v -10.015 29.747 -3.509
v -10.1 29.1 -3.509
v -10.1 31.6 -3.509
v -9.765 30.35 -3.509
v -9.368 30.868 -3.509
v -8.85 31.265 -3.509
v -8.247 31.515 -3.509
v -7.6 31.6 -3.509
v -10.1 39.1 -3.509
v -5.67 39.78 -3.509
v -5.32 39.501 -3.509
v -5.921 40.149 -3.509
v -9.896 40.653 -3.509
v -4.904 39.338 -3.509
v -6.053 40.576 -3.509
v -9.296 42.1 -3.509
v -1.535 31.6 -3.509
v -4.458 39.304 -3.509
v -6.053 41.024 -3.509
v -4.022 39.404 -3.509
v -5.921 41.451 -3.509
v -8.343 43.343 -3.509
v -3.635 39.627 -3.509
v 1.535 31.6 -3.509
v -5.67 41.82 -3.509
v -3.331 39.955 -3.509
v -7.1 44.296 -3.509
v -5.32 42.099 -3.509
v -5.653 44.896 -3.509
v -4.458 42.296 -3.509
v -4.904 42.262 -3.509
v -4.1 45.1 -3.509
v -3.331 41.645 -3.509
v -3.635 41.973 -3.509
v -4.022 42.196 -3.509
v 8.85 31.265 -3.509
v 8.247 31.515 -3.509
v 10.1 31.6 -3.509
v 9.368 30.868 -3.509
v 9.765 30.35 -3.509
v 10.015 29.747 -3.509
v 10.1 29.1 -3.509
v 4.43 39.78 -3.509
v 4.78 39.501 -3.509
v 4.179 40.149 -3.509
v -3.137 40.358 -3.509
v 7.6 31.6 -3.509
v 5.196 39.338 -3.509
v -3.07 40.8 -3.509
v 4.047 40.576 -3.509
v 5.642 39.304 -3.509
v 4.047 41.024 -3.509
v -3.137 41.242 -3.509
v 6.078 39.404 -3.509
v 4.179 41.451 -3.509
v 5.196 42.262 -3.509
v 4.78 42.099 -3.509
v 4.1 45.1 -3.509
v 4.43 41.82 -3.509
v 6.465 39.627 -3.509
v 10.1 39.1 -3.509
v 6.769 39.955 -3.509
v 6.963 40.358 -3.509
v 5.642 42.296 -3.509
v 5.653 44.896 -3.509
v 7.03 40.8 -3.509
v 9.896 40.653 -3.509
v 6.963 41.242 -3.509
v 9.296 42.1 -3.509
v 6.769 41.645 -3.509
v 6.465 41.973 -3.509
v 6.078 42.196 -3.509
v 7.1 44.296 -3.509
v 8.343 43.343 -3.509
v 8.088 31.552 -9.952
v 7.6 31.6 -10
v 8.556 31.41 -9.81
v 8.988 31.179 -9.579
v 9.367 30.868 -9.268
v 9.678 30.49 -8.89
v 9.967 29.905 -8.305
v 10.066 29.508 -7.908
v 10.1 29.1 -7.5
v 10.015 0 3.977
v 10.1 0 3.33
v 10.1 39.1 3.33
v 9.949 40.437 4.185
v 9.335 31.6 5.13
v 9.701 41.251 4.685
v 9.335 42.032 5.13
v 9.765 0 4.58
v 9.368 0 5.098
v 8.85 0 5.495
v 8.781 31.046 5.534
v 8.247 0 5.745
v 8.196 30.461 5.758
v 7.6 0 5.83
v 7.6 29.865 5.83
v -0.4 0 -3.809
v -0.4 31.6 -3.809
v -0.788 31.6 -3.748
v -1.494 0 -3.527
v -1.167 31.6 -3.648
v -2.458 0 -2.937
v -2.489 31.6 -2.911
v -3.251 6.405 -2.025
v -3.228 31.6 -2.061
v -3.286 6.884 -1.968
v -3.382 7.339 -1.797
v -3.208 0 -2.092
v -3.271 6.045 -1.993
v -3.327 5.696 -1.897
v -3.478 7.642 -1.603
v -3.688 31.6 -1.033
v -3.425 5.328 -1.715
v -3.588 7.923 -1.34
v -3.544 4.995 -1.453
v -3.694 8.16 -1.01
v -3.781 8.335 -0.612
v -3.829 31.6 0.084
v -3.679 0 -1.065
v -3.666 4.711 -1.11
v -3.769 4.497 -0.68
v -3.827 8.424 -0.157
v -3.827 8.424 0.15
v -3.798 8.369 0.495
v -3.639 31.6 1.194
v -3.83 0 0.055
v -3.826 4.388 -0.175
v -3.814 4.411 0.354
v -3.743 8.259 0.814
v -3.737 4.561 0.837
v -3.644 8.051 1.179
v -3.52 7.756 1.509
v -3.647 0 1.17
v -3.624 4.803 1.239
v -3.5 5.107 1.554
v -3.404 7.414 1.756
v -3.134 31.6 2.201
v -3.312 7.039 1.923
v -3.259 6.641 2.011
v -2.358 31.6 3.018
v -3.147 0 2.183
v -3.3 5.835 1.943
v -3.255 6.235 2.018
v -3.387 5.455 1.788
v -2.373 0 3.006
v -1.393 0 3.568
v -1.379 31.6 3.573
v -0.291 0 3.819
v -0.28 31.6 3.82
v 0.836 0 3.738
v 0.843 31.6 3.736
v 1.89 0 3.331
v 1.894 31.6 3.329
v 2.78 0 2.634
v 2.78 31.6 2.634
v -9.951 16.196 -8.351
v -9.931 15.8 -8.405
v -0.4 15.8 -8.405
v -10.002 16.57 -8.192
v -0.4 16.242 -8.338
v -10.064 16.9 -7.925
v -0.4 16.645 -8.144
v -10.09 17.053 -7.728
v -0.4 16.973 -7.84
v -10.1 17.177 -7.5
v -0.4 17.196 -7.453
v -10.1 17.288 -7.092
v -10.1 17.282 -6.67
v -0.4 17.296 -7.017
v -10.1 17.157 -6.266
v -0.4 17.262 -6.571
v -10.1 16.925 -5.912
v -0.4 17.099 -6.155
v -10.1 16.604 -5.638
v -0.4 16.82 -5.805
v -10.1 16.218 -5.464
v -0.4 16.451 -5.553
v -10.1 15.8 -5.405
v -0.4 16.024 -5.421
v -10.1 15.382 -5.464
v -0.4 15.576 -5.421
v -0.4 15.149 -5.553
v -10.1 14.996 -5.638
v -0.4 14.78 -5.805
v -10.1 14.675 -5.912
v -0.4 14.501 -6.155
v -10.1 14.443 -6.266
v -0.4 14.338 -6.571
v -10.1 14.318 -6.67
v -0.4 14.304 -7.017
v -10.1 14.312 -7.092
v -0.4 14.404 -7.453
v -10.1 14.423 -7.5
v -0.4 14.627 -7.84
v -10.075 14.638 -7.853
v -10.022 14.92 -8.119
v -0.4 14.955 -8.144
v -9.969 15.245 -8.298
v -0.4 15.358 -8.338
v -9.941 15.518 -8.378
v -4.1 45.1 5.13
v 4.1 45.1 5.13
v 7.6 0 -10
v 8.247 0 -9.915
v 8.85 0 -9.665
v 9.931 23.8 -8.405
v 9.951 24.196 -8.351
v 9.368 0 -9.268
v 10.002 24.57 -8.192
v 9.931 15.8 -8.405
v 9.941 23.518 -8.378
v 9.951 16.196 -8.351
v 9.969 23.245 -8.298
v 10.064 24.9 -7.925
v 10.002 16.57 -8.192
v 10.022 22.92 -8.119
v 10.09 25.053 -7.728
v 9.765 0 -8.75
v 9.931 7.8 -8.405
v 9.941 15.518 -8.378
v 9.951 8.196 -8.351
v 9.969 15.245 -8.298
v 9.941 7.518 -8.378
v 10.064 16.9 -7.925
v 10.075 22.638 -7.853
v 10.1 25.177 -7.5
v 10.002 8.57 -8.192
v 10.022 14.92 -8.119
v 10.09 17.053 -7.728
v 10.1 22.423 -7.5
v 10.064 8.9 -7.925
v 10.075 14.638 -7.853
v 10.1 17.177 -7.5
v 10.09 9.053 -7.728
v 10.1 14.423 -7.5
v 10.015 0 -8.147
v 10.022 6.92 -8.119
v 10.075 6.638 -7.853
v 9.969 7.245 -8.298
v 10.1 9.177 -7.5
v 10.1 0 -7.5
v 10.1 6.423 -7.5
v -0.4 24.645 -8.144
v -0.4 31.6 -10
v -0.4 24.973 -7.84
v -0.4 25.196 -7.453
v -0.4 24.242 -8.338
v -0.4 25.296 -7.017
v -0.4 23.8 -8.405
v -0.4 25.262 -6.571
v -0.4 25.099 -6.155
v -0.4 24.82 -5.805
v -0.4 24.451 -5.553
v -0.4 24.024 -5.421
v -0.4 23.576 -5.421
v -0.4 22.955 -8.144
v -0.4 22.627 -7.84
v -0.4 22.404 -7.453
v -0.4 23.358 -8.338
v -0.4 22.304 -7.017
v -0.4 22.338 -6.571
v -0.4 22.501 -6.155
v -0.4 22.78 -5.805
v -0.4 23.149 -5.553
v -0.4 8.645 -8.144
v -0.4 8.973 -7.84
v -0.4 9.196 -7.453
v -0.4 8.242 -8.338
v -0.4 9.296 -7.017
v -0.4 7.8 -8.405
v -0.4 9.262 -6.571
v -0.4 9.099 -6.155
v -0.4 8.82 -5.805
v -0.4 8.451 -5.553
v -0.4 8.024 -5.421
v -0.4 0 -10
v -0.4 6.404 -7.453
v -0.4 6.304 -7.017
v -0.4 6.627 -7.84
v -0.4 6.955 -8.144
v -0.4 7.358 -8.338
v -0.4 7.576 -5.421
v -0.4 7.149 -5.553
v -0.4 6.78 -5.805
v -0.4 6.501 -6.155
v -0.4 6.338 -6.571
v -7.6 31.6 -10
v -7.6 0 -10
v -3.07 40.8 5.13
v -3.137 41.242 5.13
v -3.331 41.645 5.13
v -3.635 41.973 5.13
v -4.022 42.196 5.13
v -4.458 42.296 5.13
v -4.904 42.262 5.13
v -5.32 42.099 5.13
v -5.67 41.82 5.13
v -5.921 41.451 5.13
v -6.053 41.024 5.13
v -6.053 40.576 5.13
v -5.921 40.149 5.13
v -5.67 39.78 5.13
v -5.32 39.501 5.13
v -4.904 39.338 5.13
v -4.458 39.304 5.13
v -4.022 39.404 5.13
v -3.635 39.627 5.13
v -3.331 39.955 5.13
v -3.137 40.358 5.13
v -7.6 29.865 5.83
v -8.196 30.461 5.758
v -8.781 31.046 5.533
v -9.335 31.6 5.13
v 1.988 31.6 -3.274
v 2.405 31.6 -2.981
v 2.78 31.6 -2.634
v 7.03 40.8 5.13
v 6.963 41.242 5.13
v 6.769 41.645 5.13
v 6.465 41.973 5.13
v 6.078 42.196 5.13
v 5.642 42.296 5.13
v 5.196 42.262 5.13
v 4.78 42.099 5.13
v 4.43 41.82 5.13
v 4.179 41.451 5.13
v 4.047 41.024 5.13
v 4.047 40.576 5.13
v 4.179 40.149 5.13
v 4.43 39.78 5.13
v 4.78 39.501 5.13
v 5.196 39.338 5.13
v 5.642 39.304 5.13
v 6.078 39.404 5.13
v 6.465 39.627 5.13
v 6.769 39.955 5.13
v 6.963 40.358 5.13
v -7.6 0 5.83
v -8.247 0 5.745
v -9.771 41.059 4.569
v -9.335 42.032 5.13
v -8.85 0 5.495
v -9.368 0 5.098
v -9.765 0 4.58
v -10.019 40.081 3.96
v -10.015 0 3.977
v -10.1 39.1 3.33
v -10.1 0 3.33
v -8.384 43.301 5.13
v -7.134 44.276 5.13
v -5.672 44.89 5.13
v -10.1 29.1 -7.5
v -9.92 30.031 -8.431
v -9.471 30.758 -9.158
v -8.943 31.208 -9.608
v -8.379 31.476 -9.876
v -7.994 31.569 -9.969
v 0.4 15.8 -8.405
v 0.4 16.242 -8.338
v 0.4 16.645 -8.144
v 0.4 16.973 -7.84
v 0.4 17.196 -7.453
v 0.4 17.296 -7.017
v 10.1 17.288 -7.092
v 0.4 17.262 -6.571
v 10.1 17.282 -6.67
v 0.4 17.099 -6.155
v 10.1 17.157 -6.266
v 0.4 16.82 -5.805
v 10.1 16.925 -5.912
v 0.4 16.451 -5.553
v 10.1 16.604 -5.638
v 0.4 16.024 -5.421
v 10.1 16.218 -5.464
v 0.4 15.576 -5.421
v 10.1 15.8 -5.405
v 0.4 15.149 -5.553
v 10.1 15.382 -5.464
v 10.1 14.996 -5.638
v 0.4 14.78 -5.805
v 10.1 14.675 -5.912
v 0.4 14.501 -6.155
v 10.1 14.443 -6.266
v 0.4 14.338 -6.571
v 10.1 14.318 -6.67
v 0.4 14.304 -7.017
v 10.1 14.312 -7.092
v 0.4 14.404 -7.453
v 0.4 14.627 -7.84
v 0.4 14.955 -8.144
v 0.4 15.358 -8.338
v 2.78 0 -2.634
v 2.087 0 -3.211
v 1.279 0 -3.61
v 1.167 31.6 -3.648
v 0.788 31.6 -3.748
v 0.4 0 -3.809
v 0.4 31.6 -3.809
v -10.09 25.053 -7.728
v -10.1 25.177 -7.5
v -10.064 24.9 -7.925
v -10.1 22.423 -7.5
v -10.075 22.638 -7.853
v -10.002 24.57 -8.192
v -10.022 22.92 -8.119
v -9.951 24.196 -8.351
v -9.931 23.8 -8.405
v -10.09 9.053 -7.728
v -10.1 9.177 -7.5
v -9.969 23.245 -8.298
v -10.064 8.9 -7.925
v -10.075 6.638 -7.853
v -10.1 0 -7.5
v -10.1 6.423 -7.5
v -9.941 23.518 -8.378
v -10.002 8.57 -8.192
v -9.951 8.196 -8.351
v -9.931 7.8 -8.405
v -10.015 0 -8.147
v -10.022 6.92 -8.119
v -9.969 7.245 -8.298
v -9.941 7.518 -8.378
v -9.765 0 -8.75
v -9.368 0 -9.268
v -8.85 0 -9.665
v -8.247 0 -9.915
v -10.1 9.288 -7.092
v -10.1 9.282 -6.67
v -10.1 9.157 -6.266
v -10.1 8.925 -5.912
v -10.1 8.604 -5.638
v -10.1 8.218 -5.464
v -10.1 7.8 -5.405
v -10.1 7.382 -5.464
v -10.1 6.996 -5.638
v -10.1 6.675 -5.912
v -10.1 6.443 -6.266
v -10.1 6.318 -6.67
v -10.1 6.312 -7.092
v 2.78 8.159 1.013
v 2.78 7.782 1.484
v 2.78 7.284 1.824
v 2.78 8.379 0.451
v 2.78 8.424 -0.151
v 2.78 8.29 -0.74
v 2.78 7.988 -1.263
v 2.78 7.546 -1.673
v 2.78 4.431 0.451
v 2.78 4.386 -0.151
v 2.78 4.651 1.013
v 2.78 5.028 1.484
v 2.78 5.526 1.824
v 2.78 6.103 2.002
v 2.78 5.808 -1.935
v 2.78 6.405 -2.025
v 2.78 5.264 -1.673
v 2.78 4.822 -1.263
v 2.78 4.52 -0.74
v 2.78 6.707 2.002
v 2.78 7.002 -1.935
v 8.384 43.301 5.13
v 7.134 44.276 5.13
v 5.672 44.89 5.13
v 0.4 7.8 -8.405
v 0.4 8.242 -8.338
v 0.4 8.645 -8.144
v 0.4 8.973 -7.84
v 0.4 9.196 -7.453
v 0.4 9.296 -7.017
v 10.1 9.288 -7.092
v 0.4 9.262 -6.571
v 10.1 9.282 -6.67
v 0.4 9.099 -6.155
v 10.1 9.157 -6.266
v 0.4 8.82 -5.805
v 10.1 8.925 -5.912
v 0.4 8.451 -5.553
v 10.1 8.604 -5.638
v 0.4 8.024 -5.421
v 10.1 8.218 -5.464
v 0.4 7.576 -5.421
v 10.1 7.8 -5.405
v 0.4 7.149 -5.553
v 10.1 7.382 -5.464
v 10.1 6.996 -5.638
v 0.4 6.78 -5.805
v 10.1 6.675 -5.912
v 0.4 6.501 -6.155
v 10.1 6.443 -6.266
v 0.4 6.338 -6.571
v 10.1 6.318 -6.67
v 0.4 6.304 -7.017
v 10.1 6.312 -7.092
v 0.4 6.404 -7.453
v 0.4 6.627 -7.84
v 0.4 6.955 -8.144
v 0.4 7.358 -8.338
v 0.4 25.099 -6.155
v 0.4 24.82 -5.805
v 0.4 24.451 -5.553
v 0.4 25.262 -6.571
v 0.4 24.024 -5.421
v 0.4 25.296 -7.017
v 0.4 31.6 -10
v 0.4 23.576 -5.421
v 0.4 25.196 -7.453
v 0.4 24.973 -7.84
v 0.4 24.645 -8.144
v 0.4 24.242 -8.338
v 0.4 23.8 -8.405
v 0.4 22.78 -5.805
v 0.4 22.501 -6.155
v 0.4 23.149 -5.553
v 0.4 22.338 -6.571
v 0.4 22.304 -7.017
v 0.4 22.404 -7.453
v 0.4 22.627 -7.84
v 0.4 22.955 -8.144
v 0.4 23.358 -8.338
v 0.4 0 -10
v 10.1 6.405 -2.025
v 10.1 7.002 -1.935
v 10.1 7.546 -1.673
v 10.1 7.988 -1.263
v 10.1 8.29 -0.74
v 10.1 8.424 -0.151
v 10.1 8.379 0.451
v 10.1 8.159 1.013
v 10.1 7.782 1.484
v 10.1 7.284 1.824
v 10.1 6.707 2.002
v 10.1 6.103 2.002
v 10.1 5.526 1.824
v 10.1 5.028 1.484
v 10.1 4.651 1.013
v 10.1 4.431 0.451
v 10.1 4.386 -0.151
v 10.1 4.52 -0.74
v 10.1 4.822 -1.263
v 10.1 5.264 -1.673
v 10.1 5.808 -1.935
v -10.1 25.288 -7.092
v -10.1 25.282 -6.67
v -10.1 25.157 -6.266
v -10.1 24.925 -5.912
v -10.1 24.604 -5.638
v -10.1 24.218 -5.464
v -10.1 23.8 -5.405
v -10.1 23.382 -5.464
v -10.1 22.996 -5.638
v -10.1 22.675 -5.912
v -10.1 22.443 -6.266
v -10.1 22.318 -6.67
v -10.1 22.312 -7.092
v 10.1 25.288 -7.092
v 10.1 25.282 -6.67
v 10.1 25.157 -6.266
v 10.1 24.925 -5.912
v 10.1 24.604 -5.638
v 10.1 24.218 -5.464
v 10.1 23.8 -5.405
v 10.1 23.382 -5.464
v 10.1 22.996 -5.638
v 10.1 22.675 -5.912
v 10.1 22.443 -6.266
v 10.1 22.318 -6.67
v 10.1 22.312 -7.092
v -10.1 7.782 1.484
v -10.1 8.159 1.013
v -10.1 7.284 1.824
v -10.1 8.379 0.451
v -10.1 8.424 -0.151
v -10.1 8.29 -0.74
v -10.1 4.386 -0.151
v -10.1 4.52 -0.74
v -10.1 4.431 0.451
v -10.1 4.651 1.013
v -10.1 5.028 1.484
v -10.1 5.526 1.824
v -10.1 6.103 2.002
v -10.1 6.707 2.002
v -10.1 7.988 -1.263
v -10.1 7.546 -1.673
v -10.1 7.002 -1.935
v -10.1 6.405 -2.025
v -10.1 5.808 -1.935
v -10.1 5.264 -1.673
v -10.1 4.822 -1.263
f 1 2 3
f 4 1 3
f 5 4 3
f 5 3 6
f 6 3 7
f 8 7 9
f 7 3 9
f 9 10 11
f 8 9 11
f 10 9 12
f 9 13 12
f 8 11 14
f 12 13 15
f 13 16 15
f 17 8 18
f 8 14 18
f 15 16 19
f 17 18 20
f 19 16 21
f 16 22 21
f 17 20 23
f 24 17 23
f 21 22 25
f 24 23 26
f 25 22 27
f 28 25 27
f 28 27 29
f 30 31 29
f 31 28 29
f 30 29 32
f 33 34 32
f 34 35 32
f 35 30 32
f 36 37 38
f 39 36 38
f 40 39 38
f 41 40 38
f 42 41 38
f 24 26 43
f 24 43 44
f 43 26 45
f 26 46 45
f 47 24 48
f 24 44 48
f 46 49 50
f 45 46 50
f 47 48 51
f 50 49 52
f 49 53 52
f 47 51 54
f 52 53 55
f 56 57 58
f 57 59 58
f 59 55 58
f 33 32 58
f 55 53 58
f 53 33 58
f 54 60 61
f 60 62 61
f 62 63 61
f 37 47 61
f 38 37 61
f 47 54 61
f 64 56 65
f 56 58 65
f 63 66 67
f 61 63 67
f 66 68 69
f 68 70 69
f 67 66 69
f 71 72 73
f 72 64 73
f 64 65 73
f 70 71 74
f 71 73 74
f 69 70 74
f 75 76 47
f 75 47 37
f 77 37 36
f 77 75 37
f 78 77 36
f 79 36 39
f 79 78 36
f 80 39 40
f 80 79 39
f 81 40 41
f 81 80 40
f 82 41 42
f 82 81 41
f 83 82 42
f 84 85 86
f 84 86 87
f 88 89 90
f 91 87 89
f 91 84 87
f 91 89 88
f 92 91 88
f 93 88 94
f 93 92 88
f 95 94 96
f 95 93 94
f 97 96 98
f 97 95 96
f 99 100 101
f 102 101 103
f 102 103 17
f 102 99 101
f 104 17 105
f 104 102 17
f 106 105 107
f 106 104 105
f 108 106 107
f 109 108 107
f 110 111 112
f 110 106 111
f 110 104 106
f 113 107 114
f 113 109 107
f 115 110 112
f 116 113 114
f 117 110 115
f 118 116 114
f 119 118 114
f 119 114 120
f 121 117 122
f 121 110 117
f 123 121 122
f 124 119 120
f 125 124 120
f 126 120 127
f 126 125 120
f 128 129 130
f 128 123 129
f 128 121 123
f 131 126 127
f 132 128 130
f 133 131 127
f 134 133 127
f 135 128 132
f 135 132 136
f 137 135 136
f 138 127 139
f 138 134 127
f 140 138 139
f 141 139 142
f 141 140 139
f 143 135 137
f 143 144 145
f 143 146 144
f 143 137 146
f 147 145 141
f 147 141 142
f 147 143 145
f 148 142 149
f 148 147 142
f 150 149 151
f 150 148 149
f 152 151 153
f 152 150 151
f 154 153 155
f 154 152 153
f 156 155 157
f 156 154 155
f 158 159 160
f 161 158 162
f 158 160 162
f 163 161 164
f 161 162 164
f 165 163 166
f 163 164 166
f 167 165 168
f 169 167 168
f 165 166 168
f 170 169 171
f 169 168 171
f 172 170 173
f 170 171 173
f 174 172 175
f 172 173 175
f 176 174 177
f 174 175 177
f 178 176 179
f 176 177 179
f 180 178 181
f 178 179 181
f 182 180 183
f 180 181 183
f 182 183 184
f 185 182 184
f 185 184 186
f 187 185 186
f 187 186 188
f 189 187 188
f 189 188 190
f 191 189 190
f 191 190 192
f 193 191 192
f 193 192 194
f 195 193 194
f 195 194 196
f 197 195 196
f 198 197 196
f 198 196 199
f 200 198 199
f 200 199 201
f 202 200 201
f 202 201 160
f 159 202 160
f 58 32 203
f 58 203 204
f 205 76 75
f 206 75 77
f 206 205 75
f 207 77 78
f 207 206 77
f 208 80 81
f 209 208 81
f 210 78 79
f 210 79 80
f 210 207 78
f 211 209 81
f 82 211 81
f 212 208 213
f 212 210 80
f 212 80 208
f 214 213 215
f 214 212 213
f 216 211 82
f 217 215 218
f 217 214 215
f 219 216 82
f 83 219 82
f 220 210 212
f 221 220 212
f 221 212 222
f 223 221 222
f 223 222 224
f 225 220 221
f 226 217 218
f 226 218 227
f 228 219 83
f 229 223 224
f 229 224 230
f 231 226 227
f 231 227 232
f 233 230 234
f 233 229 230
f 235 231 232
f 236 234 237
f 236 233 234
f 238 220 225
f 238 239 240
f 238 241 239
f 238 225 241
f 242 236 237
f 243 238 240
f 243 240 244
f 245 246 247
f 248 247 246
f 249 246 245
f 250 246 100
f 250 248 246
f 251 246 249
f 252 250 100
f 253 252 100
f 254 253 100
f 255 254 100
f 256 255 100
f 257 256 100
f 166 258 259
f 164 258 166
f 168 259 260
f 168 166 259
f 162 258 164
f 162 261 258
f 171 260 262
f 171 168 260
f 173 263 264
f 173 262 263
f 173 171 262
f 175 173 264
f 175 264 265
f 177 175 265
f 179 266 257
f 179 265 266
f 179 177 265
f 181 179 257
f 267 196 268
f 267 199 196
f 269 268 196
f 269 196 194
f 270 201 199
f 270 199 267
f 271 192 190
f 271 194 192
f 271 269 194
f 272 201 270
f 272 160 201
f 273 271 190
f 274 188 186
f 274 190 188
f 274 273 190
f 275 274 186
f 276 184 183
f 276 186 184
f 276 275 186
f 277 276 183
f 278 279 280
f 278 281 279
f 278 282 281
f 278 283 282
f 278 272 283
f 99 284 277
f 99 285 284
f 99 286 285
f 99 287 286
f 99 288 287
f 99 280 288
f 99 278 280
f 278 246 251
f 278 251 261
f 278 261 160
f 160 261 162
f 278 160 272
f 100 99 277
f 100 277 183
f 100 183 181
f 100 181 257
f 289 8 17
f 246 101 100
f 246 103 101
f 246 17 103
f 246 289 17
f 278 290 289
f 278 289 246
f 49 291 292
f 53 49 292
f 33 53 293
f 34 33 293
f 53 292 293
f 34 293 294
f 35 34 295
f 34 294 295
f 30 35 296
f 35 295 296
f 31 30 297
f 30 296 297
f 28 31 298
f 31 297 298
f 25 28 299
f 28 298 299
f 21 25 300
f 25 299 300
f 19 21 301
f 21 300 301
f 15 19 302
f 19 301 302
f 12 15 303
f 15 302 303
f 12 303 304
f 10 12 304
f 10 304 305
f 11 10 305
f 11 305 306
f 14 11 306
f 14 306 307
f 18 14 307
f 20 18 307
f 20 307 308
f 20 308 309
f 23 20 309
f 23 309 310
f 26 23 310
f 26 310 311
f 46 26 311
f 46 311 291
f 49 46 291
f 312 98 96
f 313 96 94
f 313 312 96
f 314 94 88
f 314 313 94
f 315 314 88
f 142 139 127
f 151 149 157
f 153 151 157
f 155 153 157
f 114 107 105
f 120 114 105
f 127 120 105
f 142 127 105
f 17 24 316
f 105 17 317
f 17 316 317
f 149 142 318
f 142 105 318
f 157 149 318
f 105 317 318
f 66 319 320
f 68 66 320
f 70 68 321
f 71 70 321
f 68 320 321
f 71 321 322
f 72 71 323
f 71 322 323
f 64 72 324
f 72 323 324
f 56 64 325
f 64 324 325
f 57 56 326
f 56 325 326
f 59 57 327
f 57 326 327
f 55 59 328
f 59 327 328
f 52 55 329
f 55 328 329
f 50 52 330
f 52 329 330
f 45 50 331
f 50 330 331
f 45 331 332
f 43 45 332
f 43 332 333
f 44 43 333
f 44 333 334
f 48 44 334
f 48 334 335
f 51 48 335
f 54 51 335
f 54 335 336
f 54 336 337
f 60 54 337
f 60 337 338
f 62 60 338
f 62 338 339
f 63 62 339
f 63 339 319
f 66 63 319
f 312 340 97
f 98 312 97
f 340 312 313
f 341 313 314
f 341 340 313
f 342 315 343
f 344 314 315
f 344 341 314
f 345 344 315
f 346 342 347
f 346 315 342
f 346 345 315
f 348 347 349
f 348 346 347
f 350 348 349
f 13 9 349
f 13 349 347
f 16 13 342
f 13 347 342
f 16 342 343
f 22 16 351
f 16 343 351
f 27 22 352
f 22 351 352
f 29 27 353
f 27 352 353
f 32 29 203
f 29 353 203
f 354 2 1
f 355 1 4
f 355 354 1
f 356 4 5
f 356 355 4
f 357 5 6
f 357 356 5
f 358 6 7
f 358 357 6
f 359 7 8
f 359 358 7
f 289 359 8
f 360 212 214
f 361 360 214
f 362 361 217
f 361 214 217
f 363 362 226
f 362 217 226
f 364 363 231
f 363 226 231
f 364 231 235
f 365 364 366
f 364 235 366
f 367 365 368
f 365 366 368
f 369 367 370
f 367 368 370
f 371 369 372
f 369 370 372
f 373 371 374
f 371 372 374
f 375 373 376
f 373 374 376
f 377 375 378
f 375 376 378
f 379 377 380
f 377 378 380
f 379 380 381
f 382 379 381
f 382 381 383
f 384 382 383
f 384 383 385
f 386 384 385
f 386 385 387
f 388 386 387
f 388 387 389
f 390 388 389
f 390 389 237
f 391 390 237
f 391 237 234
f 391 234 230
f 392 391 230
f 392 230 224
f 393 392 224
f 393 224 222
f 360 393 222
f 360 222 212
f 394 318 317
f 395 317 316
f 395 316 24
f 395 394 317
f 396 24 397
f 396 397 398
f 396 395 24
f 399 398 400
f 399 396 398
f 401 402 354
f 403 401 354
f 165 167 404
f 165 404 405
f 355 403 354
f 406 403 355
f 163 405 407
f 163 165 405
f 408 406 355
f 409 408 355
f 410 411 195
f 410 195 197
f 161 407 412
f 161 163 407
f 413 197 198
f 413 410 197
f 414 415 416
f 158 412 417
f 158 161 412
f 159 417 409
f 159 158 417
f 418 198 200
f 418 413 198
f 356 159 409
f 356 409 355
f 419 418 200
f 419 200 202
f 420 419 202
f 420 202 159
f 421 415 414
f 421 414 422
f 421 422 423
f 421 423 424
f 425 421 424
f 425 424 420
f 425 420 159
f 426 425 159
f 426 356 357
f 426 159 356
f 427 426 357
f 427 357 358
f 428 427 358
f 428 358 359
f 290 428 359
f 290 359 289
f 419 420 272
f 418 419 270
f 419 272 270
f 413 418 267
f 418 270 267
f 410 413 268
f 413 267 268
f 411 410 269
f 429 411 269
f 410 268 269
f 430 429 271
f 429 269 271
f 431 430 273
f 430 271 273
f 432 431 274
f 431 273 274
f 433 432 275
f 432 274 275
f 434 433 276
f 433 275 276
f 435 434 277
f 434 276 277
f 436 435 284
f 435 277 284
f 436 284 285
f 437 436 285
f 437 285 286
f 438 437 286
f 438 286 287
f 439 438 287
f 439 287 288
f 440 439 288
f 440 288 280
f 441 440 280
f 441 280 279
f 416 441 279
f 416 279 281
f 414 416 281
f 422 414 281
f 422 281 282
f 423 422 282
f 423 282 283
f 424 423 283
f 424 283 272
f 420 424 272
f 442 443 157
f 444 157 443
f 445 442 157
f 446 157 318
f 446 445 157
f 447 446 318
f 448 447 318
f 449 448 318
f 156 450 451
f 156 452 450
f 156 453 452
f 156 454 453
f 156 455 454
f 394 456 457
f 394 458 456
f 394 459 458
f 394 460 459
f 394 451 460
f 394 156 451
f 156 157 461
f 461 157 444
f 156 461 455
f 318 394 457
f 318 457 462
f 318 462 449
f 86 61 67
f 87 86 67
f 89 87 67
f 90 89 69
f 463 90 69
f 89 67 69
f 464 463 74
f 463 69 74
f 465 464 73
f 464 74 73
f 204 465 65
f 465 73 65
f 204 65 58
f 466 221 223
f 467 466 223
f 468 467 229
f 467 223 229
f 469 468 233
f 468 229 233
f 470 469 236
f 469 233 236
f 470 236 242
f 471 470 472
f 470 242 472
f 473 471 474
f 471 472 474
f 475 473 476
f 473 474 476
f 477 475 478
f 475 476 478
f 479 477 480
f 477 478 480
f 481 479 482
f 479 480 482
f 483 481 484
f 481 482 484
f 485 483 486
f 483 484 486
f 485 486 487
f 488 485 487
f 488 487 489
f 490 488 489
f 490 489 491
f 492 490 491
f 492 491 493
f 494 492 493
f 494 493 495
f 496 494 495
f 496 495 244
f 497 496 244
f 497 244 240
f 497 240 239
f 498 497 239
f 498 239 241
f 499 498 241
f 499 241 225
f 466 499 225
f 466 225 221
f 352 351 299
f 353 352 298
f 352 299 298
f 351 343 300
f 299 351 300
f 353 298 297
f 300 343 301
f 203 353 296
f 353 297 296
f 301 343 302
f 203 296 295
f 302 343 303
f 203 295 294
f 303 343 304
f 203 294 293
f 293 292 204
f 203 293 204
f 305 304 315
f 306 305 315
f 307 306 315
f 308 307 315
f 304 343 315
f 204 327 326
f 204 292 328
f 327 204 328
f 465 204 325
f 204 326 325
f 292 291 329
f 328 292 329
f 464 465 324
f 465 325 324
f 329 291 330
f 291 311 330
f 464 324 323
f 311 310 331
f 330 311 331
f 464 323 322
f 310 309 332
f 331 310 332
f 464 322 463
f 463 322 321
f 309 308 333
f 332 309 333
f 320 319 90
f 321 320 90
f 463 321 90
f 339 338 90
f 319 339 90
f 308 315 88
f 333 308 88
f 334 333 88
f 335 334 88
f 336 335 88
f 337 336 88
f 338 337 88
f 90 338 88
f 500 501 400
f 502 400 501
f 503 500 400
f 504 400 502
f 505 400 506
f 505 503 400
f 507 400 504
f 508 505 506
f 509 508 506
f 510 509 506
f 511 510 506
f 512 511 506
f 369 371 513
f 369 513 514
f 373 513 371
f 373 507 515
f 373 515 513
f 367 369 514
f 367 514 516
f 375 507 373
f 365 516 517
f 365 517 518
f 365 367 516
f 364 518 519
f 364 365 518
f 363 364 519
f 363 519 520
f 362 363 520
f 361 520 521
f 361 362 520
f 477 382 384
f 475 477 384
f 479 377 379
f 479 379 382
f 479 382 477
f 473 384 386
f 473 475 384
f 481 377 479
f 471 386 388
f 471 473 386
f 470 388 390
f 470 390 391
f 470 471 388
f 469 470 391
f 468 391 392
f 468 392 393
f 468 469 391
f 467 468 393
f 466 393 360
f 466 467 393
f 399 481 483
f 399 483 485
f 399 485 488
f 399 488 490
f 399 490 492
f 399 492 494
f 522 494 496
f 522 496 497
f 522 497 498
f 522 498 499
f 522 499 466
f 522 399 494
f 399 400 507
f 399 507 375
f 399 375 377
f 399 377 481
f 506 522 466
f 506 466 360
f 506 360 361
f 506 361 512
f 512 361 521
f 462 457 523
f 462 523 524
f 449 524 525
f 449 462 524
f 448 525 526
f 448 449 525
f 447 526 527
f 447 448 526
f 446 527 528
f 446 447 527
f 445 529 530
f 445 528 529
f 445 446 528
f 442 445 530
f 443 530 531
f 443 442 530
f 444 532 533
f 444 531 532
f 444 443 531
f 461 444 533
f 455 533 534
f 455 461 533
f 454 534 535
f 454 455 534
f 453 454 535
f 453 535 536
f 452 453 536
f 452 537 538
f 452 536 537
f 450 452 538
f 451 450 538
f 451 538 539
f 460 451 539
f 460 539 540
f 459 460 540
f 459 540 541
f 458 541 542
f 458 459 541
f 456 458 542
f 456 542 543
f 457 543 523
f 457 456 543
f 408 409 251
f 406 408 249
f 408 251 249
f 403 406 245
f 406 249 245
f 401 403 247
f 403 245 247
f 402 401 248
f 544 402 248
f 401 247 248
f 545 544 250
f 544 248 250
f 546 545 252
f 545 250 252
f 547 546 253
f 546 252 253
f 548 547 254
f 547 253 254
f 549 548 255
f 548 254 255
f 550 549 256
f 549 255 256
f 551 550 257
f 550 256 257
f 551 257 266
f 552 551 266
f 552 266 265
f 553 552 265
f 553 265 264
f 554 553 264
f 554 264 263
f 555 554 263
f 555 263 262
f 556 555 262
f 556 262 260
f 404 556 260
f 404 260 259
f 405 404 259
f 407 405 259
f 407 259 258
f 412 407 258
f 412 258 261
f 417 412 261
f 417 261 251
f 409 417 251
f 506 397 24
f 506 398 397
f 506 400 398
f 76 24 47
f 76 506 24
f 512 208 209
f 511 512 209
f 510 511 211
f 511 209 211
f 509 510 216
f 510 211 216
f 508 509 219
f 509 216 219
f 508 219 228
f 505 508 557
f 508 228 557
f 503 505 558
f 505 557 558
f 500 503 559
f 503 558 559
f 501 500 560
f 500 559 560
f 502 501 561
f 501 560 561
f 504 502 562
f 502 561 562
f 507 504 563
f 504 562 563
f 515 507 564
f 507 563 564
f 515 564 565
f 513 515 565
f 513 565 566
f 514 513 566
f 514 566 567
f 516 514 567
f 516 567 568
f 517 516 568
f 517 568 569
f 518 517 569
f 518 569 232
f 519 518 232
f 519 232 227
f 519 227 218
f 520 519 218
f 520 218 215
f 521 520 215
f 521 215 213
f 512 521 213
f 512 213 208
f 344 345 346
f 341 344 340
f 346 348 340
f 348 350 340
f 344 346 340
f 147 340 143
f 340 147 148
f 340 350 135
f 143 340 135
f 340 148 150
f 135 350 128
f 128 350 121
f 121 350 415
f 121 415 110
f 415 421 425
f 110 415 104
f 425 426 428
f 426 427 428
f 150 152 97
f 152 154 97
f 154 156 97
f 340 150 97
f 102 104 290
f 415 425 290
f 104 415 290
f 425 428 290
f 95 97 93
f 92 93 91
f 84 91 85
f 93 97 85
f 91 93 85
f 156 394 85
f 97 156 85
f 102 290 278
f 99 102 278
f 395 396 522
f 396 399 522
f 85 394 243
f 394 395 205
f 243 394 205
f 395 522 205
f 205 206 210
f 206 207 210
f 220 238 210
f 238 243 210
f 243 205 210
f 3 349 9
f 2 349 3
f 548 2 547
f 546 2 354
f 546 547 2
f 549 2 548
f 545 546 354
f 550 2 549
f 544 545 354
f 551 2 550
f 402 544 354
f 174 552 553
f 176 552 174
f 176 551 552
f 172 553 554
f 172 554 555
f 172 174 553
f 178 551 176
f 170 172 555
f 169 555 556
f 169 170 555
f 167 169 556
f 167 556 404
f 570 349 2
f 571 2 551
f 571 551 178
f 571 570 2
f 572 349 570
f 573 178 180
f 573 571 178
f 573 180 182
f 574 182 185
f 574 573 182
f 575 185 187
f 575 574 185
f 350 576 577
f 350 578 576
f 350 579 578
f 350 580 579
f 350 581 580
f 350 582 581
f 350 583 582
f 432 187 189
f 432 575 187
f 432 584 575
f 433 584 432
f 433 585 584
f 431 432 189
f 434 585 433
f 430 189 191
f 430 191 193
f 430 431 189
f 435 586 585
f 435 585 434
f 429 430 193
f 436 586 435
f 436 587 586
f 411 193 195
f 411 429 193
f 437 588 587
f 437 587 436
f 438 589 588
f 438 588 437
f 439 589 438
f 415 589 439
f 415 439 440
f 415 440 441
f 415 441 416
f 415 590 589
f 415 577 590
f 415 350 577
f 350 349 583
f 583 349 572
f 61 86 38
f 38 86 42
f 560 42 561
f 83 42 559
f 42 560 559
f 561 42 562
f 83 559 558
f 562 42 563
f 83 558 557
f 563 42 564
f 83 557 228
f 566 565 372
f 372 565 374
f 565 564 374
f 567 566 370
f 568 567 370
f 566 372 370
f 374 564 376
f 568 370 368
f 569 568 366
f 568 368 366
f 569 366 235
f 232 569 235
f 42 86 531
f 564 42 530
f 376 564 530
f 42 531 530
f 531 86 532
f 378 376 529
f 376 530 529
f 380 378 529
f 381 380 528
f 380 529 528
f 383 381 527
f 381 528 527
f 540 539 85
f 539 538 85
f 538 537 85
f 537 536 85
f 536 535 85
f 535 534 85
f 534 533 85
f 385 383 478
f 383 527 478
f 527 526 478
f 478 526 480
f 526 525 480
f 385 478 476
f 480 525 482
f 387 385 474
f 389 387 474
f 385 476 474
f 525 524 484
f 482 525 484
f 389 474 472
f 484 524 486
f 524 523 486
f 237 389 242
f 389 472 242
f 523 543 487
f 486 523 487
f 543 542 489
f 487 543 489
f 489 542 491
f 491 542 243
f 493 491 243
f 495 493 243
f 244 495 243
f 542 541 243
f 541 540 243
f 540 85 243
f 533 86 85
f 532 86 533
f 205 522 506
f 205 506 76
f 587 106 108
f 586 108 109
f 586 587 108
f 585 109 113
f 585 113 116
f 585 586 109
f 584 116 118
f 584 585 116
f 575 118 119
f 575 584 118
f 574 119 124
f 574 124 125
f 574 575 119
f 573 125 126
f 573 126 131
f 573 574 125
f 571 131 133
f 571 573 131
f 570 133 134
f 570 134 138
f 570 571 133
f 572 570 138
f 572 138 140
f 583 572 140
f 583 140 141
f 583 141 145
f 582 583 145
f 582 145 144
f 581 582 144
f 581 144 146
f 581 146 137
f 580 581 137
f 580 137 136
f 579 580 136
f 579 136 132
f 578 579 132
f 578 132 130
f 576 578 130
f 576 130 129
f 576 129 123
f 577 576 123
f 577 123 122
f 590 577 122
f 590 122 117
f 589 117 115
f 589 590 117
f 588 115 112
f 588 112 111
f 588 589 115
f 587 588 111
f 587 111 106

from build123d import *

# Parameters (mm, degrees)
CROQUIS1_W                 = 20.2
CROQUIS1_H                 = 15.83
SALIENTE_EXTRUIR1_DEPTH    = 31.6
CORTAR_EXTRUIR4_DEPTH      = 31.6
CORTAR_EXTRUIR5_DEPTH      = 35.649242416
CORTAR_EXTRUIR6_DEPTH      = 35.649242416
CORTAR_EXTRUIR6_DEPTH_BACK = 35.649242416
CROQUIS5_R                 = 2.025
CROQUIS6_R                 = 1.5
CORTAR_EXTRUIR7_DEPTH      = 39.814945709
CROQUIS10_W                = 20.2
CROQUIS10_H                = 8.639055001
SALIENTE_EXTRUIR4_DEPTH    = 13.5
CORTAR_EXTRUIR8_REACH      = 50.631
CROQUIS11_R                = 1.5
REDONDEO2_START            = -1
REDONDEO2_DEPTH            = 47
REDONDEO2_START_2          = -10
REDONDEO2_2_DEPTH          = 20
REDONDEO2_START_3          = -11
REDONDEO2_3_DEPTH          = 7.490944999
REDONDEO3_R                = 6


with BuildPart() as part:
    # Croquis1 → Saliente-Extruir1 (new body)
    with BuildSketch(Plane(origin=(0, 0, 0), x_dir=(1, 0, 0), z_dir=(0, 1, 0))):
        with Locations((0, 2.085)):
            Rectangle(CROQUIS1_W, CROQUIS1_H)
    extrude(amount=SALIENTE_EXTRUIR1_DEPTH)

    # Croquis2 → Cortar-Extruir4 (cut)
    with BuildSketch(Plane.XZ):
        with BuildLine():
            Line((2.78, 2.634482871), (2.78, -2.634482871))
            ThreePointArc((2.78, -2.634482871), (-3.83, 0), (2.78, 2.634482871))
        make_face()
    extrude(amount=-CORTAR_EXTRUIR4_DEPTH, mode=Mode.SUBTRACT)

    # Croquis4 → Cortar-Extruir5 (cut, through all)
    with BuildSketch(Plane.XZ):
        with BuildLine():
            Line((-0.4, -10), (-0.4, -3.809055001))
            ThreePointArc((-0.4, -3.809055001), (0, -3.83), (0.4, -3.809055001))
            Line((0.4, -3.809055001), (0.4, -10))
            Line((0.4, -10), (-0.4, -10))
        make_face()
    extrude(amount=-CORTAR_EXTRUIR5_DEPTH, mode=Mode.SUBTRACT)

    # Croquis5 → Cortar-Extruir6 (cut, two sides: drawn at the far end of the back side and taken through both)
    with BuildSketch(Plane(origin=(0, 0, 0), x_dir=(0, 0, -1), z_dir=(1, 0, 0)).offset(-CORTAR_EXTRUIR6_DEPTH_BACK)):
        with Locations((0, 6.405)):
            Circle(CROQUIS5_R)
    extrude(amount=CORTAR_EXTRUIR6_DEPTH + CORTAR_EXTRUIR6_DEPTH_BACK, mode=Mode.SUBTRACT)

    # Croquis6 → Cortar-Extruir7 (cut, through all)
    with BuildSketch(Plane(origin=(10.1, 0, 0), x_dir=(0, 0, -1), z_dir=(1, 0, 0))):
        with Locations((6.9045275, 23.8)):
            Circle(CROQUIS6_R)
        with Locations((6.9045275, 15.8)):
            Circle(CROQUIS6_R)
        with Locations((6.9045275, 7.8)):
            Circle(CROQUIS6_R)
    extrude(amount=-CORTAR_EXTRUIR7_DEPTH, mode=Mode.SUBTRACT)

    # Croquis10 → Saliente-Extruir4 (add)
    with BuildSketch(Plane(origin=(0, 31.6, 0), x_dir=(1, 0, 0), z_dir=(0, 1, 0))):
        with Locations((0, -0.810472499)):
            Rectangle(CROQUIS10_W, CROQUIS10_H)
    extrude(amount=SALIENTE_EXTRUIR4_DEPTH)

    # Croquis11 → Cortar-Extruir8 (cut, up to next)
    with BuildSketch(Plane.XY.offset(5.13), mode=Mode.PRIVATE) as cortar_extruir8_sk1:
        with Locations((-4.57, 40.8)):
            Circle(CROQUIS11_R)
    cortar_extruir8_tool1 = extrude(cortar_extruir8_sk1.sketch, amount=-CORTAR_EXTRUIR8_REACH, mode=Mode.PRIVATE) & part.part
    # Croquis11 → Cortar-Extruir8 (cut, up to next)
    with BuildSketch(Plane.XY.offset(5.13), mode=Mode.PRIVATE) as cortar_extruir8_sk2:
        with Locations((5.53, 40.8)):
            Circle(CROQUIS11_R)
    cortar_extruir8_tool2 = extrude(cortar_extruir8_sk2.sketch, amount=-CORTAR_EXTRUIR8_REACH, mode=Mode.PRIVATE) & part.part
    add(cortar_extruir8_tool1.solids().sort_by_distance((-4.57, 40.8, 5.13))[0], mode=Mode.SUBTRACT)
    add(cortar_extruir8_tool2.solids().sort_by_distance((5.53, 40.8, 5.13))[0], mode=Mode.SUBTRACT)

    # Redondeo2: read off the stored shape, not the designer's step
    # Redondeo2 outline → Redondeo2 (cut)
    with BuildSketch(Plane(origin=(0, 0, 0), x_dir=(1, 0, 0), z_dir=(0, 1, 0)).offset(REDONDEO2_START)):
        with BuildLine():
            Line((-10.1, -5.83), (-7.6, -5.83))
            ThreePointArc((-7.6, -5.83), (-9.367766953, -5.097766953), (-10.1, -3.33))
            Line((-10.1, -3.33), (-10.1, -5.83))
        make_face()
        with BuildLine():
            ThreePointArc((7.6, 10), (9.367766953, 9.267766953), (10.1, 7.5))
            Line((10.1, 7.5), (10.1, 10))
            Line((10.1, 10), (7.6, 10))
        make_face()
        with BuildLine():
            ThreePointArc((10.1, -3.33), (9.367766953, -5.097766953), (7.6, -5.83))
            Line((7.6, -5.83), (10.1, -5.83))
            Line((10.1, -5.83), (10.1, -3.33))
        make_face()
        with BuildLine():
            Line((-10.1, 10), (-10.1, 7.5))
            ThreePointArc((-10.1, 7.5), (-9.367766953, 9.267766953), (-7.6, 10))
            Line((-7.6, 10), (-10.1, 10))
        make_face()
    extrude(amount=REDONDEO2_DEPTH, mode=Mode.SUBTRACT)

    # Redondeo2 2 outline → Redondeo2 2 (cut)
    with BuildSketch(Plane.YZ.offset(REDONDEO2_START_2)):
        with BuildLine():
            ThreePointArc((29.865064843, 5.83), (30.80047919, 5.648404624), (31.6, 5.13))
            Line((31.6, 5.13), (31.6, 5.83))
            Line((31.6, 5.83), (29.865064843, 5.83))
        make_face()
    extrude(amount=REDONDEO2_2_DEPTH, mode=Mode.SUBTRACT)

    # Redondeo2 3 outline → Redondeo2 3 (cut)
    with BuildSketch(Plane.XY.offset(REDONDEO2_START_3)):
        with BuildLine():
            Line((10.1, 31.6), (7.6, 31.6))
            ThreePointArc((7.6, 31.6), (9.367766953, 30.867766953), (10.1, 29.1))
            Line((10.1, 29.1), (10.1, 31.6))
        make_face()
        with BuildLine():
            ThreePointArc((-10.1, 29.1), (-9.367766953, 30.867766953), (-7.6, 31.6))
            Line((-7.6, 31.6), (-10.1, 31.6))
            Line((-10.1, 31.6), (-10.1, 29.1))
        make_face()
    extrude(amount=REDONDEO2_3_DEPTH, mode=Mode.SUBTRACT)

    # Redondeo3
    # the kernel refuses this fillet: 6 mm, written as the material it takes off along each edge
    with BuildSketch(Plane(origin=(-10.1, 45.1, 18.33), x_dir=(1, 0, 0), z_dir=(0, 0, -1))) as redondeo3_piece_1:
        with BuildLine():
            CenterArc((REDONDEO3_R, REDONDEO3_R), REDONDEO3_R, 180, 90)
            Line((0, REDONDEO3_R), (0, 0))
            Line((0, 0), (REDONDEO3_R, 0))
        make_face()
    extrude(amount=36.839055001, mode=Mode.SUBTRACT)
    with BuildSketch(Plane(origin=(10.1, 45.1, -18.509055001), x_dir=(0, -1, 0), z_dir=(0, 0, 1))) as redondeo3_piece_2:
        with BuildLine():
            CenterArc((REDONDEO3_R, -REDONDEO3_R), REDONDEO3_R, 90, 90)
            Line((0, -REDONDEO3_R), (0, 0))
            Line((0, 0), (REDONDEO3_R, 0))
        make_face()
    extrude(amount=36.839055001, mode=Mode.SUBTRACT)


solid = part.part
